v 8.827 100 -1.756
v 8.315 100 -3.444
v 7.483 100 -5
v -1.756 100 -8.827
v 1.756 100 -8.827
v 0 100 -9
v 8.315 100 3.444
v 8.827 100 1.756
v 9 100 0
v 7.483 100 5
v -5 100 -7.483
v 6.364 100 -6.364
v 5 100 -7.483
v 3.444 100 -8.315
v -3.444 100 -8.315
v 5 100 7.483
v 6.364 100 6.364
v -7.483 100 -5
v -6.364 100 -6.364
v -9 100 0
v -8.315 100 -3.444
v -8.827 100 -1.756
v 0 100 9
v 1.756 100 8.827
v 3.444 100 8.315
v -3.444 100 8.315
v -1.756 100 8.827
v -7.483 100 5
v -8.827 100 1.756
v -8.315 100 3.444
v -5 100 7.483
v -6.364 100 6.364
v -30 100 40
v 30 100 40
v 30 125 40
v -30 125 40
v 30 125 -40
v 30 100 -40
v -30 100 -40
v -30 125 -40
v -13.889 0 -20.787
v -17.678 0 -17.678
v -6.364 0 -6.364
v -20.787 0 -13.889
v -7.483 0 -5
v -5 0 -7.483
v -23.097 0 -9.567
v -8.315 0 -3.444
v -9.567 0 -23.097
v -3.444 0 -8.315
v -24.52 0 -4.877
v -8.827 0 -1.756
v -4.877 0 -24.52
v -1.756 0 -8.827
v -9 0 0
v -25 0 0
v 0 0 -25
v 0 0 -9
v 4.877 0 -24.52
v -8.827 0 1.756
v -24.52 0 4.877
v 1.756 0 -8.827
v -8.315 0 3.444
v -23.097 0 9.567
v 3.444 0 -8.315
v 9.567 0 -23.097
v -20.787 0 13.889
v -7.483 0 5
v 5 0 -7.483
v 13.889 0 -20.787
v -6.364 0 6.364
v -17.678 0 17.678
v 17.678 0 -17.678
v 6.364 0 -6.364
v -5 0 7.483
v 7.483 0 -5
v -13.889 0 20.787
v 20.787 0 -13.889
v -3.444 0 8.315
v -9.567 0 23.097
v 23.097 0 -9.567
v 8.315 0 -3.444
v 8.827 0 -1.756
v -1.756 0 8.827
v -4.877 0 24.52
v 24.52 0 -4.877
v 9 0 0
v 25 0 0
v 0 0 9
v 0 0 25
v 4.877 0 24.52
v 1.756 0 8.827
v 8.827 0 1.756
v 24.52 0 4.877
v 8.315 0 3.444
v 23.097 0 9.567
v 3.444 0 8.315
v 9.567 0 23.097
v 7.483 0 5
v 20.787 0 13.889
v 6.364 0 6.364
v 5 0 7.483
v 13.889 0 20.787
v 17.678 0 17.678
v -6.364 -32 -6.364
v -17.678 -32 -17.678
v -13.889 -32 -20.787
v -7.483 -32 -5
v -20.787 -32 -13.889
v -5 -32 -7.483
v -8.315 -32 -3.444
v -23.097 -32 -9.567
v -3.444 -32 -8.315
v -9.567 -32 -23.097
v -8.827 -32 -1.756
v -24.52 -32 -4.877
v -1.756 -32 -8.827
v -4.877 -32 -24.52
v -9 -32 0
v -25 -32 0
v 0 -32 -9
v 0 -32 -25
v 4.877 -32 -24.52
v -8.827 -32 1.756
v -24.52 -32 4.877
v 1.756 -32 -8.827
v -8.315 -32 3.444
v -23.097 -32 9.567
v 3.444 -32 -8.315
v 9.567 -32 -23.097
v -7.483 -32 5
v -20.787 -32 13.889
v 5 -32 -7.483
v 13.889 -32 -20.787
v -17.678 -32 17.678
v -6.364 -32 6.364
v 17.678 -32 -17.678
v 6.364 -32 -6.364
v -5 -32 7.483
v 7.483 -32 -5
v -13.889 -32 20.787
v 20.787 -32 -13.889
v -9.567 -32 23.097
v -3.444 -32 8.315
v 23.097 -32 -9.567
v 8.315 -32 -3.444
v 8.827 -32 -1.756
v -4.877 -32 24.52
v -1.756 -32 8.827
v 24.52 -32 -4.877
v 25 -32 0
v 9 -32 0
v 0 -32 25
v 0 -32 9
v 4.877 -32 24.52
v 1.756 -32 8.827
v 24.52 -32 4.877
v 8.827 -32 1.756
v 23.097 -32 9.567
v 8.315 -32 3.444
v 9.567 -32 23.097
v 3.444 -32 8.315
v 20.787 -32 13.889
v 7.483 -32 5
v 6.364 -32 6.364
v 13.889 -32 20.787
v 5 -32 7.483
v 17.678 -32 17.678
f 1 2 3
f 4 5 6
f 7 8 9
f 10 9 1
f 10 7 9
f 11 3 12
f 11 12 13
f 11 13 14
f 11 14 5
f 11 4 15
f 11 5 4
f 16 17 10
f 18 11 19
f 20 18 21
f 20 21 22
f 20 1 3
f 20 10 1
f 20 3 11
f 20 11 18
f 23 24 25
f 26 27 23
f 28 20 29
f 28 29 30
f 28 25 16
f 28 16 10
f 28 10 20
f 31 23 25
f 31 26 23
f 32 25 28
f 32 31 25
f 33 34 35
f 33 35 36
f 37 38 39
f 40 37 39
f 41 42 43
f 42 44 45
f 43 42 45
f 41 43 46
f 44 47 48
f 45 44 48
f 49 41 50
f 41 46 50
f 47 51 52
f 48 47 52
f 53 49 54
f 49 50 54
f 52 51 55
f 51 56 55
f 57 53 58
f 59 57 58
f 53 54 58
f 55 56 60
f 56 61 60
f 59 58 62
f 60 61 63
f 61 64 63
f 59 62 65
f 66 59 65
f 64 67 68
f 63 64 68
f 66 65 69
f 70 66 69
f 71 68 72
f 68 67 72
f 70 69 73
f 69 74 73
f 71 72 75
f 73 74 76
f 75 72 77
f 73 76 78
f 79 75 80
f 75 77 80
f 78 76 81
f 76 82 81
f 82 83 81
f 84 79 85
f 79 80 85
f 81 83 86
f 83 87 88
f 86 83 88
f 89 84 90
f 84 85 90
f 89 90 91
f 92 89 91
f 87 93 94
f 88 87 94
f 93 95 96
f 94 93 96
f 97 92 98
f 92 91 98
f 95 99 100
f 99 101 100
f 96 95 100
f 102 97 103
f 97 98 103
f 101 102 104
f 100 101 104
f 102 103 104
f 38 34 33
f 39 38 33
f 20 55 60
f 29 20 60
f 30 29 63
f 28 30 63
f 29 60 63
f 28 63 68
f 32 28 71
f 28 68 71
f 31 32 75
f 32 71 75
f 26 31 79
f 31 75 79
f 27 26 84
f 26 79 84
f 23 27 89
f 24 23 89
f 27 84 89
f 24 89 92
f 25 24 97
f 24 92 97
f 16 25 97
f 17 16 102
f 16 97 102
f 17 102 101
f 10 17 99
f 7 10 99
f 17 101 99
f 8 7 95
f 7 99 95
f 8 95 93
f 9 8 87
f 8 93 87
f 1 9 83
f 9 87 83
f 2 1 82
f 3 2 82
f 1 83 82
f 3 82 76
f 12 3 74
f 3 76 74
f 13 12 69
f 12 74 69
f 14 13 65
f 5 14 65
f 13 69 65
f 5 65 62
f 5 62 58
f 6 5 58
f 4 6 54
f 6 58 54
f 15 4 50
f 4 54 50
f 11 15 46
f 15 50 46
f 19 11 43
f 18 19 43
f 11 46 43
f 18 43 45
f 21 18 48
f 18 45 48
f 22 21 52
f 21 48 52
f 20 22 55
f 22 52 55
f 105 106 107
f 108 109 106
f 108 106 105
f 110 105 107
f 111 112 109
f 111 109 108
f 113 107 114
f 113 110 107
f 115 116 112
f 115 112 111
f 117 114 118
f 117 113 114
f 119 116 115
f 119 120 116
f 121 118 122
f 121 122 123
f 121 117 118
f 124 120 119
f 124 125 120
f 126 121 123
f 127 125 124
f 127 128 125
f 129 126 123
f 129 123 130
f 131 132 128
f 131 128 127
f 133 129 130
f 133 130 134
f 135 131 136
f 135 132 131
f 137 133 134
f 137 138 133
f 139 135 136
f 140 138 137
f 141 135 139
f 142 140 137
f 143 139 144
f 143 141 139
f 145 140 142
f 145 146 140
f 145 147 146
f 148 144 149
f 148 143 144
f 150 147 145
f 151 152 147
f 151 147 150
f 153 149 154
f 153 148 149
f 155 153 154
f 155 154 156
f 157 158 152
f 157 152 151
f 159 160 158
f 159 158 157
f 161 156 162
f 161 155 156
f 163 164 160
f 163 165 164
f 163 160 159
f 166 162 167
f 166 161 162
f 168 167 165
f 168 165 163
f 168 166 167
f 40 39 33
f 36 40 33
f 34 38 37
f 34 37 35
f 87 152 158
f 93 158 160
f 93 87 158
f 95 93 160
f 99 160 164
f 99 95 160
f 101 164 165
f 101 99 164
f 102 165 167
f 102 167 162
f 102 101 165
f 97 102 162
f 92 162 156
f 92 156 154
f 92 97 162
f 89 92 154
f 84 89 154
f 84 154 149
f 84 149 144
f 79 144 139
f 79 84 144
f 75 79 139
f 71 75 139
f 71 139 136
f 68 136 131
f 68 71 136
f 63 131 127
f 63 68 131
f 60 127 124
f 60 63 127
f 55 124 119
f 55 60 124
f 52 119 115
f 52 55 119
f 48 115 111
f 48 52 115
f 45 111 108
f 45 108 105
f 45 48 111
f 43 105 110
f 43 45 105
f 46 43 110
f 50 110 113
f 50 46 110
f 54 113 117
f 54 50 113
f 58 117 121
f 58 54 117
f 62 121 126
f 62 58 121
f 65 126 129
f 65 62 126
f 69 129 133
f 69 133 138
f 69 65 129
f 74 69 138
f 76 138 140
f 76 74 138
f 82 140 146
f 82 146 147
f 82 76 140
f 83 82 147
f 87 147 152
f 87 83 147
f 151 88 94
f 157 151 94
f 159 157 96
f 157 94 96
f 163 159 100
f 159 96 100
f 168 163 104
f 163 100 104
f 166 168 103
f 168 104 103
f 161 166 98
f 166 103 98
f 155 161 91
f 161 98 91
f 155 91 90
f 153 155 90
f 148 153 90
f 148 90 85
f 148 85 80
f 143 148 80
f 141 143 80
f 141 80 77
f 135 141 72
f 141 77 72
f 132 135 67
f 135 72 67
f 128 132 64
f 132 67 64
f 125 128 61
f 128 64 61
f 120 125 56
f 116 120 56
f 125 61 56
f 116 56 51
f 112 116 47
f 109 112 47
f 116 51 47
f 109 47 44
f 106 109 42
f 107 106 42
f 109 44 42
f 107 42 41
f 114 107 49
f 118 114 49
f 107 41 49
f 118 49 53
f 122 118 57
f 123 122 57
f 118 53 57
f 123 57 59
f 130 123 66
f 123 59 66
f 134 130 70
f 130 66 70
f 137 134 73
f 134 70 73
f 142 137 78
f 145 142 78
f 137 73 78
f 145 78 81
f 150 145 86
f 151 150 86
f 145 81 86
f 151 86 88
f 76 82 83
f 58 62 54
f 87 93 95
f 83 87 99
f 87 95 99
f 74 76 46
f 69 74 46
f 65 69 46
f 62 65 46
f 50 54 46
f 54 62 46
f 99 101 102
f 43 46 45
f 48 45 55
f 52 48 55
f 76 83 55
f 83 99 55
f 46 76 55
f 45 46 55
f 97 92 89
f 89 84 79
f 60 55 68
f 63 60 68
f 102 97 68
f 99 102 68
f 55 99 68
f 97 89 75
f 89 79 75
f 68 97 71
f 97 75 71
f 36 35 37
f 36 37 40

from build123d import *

# Parameters (mm, degrees)
F0_R     = 25
F0_R_2   = 9
F1_DEPTH = 32
F2_R     = 9
F3_DEPTH = 100
F4_W     = 60
F4_H     = 80
F5_DEPTH = 25


with BuildPart() as f1:
    # F0 (on Front) → F1 (new body)
    with BuildSketch(Plane.XZ):
        Circle(F0_R)
        Circle(F0_R_2, mode=Mode.SUBTRACT)
    extrude(amount=F1_DEPTH)


with BuildPart() as f3:
    # F2 (on face) → F3 (new body)
    with BuildSketch(Plane(origin=(0, 0, 0), x_dir=(-1, 0, 0), z_dir=(0, 1, 0))):
        Circle(F2_R)
    extrude(amount=F3_DEPTH)


with BuildPart() as f5:
    # F4 (on face) → F5 (new body)
    with BuildSketch(Plane(origin=(0, 100, 0), x_dir=(-1, 0, 0), z_dir=(0, 1, 0))):
        Rectangle(F4_W, F4_H)
    extrude(amount=F5_DEPTH)


solid = Compound([f1.part, f3.part, f5.part])
